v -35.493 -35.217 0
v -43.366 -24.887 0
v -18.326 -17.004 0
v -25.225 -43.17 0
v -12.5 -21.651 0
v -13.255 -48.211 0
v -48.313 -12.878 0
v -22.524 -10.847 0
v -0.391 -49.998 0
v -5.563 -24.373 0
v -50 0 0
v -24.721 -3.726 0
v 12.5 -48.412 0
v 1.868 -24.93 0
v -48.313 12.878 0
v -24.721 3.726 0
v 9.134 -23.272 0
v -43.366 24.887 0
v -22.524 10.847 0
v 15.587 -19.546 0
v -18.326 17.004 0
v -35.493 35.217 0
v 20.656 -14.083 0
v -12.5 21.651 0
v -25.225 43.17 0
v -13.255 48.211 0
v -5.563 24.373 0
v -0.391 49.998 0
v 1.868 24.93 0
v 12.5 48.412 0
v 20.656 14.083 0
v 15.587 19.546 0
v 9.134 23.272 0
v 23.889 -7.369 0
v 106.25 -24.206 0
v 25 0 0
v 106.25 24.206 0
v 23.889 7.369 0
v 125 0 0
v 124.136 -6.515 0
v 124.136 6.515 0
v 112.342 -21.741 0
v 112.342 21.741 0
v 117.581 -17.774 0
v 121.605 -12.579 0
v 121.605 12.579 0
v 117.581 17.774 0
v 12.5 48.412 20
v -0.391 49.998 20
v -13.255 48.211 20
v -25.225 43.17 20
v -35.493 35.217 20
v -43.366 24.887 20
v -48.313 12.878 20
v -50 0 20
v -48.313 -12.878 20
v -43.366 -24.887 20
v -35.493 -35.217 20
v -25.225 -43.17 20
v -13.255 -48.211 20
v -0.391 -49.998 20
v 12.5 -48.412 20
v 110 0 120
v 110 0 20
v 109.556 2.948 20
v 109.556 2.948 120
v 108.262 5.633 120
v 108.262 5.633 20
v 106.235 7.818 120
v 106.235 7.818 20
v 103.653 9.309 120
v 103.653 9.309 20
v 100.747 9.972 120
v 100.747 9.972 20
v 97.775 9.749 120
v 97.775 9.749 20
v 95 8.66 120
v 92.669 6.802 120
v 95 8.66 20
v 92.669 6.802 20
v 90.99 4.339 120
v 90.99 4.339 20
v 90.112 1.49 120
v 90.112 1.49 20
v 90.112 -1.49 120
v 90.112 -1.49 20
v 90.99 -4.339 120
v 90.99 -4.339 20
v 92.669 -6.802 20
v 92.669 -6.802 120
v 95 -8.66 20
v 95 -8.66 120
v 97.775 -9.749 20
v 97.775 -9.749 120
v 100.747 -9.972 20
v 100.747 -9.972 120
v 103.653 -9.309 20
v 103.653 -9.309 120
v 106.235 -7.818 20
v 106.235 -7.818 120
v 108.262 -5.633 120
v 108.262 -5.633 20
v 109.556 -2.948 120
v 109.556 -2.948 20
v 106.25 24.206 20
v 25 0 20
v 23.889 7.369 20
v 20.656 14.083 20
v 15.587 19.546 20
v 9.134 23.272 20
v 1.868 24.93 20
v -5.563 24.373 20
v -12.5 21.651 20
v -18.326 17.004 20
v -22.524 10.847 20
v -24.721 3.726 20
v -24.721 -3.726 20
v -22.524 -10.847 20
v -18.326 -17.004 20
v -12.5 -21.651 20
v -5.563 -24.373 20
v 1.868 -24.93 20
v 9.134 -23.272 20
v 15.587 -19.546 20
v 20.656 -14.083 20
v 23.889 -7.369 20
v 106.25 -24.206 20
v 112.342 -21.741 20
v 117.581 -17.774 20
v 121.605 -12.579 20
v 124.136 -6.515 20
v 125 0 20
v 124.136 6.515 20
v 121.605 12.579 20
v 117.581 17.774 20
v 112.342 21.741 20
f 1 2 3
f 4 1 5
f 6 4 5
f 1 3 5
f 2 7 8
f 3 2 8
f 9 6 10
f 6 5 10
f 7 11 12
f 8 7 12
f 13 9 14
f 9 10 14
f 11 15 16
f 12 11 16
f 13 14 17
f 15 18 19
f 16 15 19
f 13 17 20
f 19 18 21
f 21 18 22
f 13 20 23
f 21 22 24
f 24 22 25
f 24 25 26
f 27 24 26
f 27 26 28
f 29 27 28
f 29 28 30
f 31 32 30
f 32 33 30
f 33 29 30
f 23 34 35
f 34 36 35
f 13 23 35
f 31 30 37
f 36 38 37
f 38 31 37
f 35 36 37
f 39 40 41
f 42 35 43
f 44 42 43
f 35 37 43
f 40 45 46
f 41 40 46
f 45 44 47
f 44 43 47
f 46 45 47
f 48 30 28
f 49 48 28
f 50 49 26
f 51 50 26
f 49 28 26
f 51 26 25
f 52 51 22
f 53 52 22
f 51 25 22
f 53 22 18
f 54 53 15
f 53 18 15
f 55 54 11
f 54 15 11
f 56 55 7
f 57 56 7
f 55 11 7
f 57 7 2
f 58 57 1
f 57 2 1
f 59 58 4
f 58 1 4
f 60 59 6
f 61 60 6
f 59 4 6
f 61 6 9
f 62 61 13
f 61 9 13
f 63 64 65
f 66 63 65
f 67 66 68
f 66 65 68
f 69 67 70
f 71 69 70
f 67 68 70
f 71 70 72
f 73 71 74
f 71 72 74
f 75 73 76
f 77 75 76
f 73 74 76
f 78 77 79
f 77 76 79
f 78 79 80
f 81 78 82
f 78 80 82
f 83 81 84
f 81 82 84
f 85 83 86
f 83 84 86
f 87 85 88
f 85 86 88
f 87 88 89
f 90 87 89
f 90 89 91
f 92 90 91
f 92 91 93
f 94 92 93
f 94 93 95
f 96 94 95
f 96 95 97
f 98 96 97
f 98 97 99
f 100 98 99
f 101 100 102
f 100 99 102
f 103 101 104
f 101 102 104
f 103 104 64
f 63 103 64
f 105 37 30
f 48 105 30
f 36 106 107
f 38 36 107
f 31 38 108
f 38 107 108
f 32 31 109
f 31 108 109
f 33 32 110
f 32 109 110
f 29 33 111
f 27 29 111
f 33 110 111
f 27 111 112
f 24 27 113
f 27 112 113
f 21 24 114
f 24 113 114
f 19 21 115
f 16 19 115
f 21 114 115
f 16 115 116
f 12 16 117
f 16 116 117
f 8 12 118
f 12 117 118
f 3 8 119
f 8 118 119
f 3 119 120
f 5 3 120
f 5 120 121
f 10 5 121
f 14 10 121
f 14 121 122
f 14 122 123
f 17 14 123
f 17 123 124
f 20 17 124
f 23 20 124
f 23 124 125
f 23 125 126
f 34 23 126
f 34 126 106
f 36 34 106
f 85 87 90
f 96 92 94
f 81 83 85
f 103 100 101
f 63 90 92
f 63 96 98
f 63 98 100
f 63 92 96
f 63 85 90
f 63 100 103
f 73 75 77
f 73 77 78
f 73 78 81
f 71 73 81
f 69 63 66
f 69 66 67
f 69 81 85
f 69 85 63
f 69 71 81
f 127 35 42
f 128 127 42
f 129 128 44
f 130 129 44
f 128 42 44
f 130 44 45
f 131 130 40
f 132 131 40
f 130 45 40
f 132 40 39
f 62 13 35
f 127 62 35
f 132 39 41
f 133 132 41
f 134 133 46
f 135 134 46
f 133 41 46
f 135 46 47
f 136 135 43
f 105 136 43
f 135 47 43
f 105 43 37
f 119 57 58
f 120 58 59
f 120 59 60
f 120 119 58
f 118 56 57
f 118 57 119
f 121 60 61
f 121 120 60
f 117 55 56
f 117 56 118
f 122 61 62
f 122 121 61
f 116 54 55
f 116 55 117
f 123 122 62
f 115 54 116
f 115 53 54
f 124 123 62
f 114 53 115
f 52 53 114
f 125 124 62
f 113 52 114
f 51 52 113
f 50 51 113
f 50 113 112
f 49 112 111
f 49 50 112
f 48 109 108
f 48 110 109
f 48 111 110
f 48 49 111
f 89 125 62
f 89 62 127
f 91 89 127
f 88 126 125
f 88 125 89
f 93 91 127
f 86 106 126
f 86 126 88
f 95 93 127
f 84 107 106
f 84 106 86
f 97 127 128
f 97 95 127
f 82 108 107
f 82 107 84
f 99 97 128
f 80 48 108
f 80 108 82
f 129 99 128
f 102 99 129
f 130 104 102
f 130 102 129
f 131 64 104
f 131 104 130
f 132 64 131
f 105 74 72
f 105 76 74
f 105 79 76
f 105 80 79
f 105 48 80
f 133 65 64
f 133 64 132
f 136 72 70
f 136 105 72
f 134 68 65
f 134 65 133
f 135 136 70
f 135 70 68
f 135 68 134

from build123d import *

# Parameters (mm, degrees)
F1_DEPTH = 20
F3_R     = 25
F2_DEPTH = 20.001
F4_R     = 10
F5_DEPTH = 100


with BuildPart() as f1:
    # F0 (on Top) → F1 (new body)
    with BuildSketch(Plane.XY):
        with BuildLine():
            ThreePointArc((12.5, -48.412292), (39.528471, -30.618622), (50, 0))
            ThreePointArc((50, 0), (39.528471, 30.618622), (12.5, 48.412292))
            ThreePointArc((12.5, 48.412292), (-50, 0), (12.5, -48.412292))
        make_face()
        with BuildLine():
            ThreePointArc((12.5, 48.412292), (39.528471, 30.618622), (50, 0))
            Line((50, 0), (75, 0))
            ThreePointArc((75, 0), (84.690689, 19.764235), (106.25, 24.206146))
            Line((106.25, 24.206146), (12.5, 48.412292))
        make_face()
        with BuildLine():
            Line((75, 0), (50, 0))
            ThreePointArc((50, 0), (39.528471, -30.618622), (12.5, -48.412292))
            Line((12.5, -48.412292), (106.25, -24.206146))
            ThreePointArc((106.25, -24.206146), (84.690689, -19.764235), (75, 0))
        make_face()
        with BuildLine():
            ThreePointArc((106.25, 24.206146), (84.690689, 19.764235), (75, 0))
            ThreePointArc((75, 0), (84.690689, -19.764235), (106.25, -24.206146))
            ThreePointArc((106.25, -24.206146), (119.764235, -15.309311), (125, 0))
            ThreePointArc((125, 0), (119.764235, 15.309311), (106.25, 24.206146))
        make_face()
    extrude(amount=F1_DEPTH)

    # F3 (on face) → F2 (cut, through all)
    with BuildSketch(Plane.XY.offset(20)):
        Circle(F3_R)
    extrude(amount=-F2_DEPTH, mode=Mode.SUBTRACT)

    # F4 (on face) → F5 (join)
    with BuildSketch(Plane.XY.offset(20)):
        with Locations((100, 0)):
            Circle(F4_R)
    extrude(amount=F5_DEPTH)


solid = f1.part
